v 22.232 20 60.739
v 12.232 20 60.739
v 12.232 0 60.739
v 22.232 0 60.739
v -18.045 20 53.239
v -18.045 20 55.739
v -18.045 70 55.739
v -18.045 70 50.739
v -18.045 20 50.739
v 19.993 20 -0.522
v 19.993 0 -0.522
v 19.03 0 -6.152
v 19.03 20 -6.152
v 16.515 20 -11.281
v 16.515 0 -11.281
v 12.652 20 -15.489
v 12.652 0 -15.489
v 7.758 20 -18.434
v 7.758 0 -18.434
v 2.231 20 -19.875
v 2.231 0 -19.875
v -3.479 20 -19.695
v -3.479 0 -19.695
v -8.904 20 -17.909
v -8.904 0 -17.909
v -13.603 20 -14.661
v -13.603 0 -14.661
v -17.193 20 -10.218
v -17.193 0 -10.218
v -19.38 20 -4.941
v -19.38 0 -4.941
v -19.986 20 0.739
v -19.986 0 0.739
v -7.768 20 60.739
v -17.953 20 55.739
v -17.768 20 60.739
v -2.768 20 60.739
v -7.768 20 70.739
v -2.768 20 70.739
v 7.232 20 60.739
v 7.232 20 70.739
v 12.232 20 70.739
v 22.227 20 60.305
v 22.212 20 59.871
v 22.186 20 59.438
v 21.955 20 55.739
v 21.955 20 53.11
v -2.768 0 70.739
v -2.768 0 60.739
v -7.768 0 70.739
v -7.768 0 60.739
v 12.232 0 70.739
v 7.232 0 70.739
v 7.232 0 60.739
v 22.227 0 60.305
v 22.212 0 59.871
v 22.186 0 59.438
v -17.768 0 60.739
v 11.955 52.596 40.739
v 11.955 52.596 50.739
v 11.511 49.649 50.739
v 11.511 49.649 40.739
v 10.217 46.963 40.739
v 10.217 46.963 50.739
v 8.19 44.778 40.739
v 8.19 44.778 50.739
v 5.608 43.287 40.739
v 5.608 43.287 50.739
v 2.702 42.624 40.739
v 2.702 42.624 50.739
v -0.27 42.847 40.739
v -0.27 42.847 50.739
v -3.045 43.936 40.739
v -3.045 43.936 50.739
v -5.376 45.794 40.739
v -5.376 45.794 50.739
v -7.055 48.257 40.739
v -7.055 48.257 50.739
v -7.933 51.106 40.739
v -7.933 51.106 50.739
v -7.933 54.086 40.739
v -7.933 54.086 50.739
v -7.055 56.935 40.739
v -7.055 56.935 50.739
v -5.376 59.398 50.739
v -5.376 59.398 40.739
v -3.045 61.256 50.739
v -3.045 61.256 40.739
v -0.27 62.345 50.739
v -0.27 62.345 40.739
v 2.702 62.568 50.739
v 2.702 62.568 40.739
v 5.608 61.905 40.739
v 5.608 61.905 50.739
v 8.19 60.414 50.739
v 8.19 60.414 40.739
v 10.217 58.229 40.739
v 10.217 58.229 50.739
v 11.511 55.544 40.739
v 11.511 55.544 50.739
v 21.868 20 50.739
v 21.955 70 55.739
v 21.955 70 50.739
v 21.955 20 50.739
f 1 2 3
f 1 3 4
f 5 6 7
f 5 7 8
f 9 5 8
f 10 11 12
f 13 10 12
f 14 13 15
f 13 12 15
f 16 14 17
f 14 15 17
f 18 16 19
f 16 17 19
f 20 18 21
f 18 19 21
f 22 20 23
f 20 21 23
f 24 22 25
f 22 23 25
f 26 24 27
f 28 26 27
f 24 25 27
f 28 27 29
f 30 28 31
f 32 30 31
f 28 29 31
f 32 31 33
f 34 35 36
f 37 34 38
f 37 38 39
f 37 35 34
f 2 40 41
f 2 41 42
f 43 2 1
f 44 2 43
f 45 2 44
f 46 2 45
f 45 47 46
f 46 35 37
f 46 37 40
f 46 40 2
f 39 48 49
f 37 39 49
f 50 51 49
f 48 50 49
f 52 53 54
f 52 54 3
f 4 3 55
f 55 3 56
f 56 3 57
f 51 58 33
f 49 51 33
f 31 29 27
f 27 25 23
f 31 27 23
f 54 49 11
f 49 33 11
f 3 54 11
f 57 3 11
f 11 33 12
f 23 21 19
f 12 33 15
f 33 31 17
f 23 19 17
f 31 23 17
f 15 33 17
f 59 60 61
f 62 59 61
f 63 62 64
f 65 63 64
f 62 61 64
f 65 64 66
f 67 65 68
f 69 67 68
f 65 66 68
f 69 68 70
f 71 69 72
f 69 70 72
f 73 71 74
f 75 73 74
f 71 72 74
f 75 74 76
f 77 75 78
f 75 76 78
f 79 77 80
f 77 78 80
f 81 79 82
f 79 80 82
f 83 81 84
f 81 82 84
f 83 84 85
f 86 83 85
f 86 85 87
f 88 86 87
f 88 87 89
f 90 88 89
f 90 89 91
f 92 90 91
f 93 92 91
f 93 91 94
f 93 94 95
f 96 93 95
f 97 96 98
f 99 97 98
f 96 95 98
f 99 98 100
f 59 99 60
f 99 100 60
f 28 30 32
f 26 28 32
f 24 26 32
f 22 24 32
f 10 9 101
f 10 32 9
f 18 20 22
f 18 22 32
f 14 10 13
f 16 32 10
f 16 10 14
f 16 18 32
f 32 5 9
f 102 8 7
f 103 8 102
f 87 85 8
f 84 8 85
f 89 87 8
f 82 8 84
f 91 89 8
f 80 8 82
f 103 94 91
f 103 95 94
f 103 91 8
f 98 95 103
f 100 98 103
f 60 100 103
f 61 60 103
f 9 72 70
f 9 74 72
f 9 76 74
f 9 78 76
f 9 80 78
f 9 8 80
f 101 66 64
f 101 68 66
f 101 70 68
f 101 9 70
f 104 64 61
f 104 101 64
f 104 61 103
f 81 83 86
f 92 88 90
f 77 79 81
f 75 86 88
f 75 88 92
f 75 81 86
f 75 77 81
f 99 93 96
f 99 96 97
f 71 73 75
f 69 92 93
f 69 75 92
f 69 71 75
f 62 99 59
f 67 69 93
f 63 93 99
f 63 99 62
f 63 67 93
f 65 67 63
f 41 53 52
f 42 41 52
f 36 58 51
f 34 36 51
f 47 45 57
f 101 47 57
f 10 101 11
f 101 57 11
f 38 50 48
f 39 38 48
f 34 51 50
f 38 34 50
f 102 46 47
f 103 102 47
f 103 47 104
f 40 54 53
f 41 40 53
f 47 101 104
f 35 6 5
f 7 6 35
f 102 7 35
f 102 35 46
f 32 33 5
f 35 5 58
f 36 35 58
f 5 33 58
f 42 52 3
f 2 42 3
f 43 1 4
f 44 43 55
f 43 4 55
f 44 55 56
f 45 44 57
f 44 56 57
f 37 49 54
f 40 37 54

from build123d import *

# Parameters (mm, degrees)
BOSS_EXTRUDE1_DEPTH = 20
SKETCH2_W           = 40
SKETCH2_H           = 5
BOSS_EXTRUDE2_DEPTH = 50
SKETCH3_R           = 10
BOSS_EXTRUDE3_DEPTH = 10


with BuildPart() as part:
    # Sketch1 → Boss-Extrude1 (new body)
    with BuildSketch(Plane(origin=(0, 0, 0), x_dir=(1, 0, 0), z_dir=(0, 1, 0))):
        with BuildLine():
            Line((22.186265925, -59.437832279), (19.9931848, 0.522074285))
            ThreePointArc((19.9931848, 0.522074285), (-0.630541833, 19.990057954), (-19.986342651, -0.738990821))
            Line((-19.986342651, -0.738990821), (-17.767855256, -60.738990821))
            Line((-17.767855256, -60.738990821), (-7.767855256, -60.738990821))
            Line((-7.767855256, -60.738990821), (-7.767855256, -70.738990821))
            Line((-7.767855256, -70.738990821), (-2.767855256, -70.738990821))
            Line((-2.767855256, -70.738990821), (-2.767855256, -60.738990821))
            Line((-2.767855256, -60.738990821), (7.232144744, -60.738990821))
            Line((7.232144744, -60.738990821), (7.232144744, -70.738990821))
            Line((7.232144744, -70.738990821), (12.232144744, -70.738990821))
            Line((12.232144744, -70.738990821), (12.232144744, -60.738990821))
            Line((12.232144744, -60.738990821), (22.232144744, -60.738990821))
            ThreePointArc((22.232144744, -60.738990821), (22.220671476, -60.088007254), (22.186265925, -59.437832279))
        make_face()
    extrude(amount=BOSS_EXTRUDE1_DEPTH)

    # Sketch2 → Boss-Extrude2 (add)
    with BuildSketch(Plane(origin=(0, 20, 0), x_dir=(1, 0, 0), z_dir=(0, 1, 0))):
        with Locations((1.954821984, -53.238670729)):
            Rectangle(SKETCH2_W, SKETCH2_H)
    extrude(amount=BOSS_EXTRUDE2_DEPTH)

    # Sketch3 → Boss-Extrude3 (add)
    with BuildSketch(Plane(origin=(0, -50, 50.738670729), x_dir=(-1, 0, 0), z_dir=(0, 0, -1))):
        with Locations(Location((-1.954821984, 102.596055016, 0), (0, 0, 180))):
            Circle(SKETCH3_R)
    extrude(amount=BOSS_EXTRUDE3_DEPTH)


solid = part.part
